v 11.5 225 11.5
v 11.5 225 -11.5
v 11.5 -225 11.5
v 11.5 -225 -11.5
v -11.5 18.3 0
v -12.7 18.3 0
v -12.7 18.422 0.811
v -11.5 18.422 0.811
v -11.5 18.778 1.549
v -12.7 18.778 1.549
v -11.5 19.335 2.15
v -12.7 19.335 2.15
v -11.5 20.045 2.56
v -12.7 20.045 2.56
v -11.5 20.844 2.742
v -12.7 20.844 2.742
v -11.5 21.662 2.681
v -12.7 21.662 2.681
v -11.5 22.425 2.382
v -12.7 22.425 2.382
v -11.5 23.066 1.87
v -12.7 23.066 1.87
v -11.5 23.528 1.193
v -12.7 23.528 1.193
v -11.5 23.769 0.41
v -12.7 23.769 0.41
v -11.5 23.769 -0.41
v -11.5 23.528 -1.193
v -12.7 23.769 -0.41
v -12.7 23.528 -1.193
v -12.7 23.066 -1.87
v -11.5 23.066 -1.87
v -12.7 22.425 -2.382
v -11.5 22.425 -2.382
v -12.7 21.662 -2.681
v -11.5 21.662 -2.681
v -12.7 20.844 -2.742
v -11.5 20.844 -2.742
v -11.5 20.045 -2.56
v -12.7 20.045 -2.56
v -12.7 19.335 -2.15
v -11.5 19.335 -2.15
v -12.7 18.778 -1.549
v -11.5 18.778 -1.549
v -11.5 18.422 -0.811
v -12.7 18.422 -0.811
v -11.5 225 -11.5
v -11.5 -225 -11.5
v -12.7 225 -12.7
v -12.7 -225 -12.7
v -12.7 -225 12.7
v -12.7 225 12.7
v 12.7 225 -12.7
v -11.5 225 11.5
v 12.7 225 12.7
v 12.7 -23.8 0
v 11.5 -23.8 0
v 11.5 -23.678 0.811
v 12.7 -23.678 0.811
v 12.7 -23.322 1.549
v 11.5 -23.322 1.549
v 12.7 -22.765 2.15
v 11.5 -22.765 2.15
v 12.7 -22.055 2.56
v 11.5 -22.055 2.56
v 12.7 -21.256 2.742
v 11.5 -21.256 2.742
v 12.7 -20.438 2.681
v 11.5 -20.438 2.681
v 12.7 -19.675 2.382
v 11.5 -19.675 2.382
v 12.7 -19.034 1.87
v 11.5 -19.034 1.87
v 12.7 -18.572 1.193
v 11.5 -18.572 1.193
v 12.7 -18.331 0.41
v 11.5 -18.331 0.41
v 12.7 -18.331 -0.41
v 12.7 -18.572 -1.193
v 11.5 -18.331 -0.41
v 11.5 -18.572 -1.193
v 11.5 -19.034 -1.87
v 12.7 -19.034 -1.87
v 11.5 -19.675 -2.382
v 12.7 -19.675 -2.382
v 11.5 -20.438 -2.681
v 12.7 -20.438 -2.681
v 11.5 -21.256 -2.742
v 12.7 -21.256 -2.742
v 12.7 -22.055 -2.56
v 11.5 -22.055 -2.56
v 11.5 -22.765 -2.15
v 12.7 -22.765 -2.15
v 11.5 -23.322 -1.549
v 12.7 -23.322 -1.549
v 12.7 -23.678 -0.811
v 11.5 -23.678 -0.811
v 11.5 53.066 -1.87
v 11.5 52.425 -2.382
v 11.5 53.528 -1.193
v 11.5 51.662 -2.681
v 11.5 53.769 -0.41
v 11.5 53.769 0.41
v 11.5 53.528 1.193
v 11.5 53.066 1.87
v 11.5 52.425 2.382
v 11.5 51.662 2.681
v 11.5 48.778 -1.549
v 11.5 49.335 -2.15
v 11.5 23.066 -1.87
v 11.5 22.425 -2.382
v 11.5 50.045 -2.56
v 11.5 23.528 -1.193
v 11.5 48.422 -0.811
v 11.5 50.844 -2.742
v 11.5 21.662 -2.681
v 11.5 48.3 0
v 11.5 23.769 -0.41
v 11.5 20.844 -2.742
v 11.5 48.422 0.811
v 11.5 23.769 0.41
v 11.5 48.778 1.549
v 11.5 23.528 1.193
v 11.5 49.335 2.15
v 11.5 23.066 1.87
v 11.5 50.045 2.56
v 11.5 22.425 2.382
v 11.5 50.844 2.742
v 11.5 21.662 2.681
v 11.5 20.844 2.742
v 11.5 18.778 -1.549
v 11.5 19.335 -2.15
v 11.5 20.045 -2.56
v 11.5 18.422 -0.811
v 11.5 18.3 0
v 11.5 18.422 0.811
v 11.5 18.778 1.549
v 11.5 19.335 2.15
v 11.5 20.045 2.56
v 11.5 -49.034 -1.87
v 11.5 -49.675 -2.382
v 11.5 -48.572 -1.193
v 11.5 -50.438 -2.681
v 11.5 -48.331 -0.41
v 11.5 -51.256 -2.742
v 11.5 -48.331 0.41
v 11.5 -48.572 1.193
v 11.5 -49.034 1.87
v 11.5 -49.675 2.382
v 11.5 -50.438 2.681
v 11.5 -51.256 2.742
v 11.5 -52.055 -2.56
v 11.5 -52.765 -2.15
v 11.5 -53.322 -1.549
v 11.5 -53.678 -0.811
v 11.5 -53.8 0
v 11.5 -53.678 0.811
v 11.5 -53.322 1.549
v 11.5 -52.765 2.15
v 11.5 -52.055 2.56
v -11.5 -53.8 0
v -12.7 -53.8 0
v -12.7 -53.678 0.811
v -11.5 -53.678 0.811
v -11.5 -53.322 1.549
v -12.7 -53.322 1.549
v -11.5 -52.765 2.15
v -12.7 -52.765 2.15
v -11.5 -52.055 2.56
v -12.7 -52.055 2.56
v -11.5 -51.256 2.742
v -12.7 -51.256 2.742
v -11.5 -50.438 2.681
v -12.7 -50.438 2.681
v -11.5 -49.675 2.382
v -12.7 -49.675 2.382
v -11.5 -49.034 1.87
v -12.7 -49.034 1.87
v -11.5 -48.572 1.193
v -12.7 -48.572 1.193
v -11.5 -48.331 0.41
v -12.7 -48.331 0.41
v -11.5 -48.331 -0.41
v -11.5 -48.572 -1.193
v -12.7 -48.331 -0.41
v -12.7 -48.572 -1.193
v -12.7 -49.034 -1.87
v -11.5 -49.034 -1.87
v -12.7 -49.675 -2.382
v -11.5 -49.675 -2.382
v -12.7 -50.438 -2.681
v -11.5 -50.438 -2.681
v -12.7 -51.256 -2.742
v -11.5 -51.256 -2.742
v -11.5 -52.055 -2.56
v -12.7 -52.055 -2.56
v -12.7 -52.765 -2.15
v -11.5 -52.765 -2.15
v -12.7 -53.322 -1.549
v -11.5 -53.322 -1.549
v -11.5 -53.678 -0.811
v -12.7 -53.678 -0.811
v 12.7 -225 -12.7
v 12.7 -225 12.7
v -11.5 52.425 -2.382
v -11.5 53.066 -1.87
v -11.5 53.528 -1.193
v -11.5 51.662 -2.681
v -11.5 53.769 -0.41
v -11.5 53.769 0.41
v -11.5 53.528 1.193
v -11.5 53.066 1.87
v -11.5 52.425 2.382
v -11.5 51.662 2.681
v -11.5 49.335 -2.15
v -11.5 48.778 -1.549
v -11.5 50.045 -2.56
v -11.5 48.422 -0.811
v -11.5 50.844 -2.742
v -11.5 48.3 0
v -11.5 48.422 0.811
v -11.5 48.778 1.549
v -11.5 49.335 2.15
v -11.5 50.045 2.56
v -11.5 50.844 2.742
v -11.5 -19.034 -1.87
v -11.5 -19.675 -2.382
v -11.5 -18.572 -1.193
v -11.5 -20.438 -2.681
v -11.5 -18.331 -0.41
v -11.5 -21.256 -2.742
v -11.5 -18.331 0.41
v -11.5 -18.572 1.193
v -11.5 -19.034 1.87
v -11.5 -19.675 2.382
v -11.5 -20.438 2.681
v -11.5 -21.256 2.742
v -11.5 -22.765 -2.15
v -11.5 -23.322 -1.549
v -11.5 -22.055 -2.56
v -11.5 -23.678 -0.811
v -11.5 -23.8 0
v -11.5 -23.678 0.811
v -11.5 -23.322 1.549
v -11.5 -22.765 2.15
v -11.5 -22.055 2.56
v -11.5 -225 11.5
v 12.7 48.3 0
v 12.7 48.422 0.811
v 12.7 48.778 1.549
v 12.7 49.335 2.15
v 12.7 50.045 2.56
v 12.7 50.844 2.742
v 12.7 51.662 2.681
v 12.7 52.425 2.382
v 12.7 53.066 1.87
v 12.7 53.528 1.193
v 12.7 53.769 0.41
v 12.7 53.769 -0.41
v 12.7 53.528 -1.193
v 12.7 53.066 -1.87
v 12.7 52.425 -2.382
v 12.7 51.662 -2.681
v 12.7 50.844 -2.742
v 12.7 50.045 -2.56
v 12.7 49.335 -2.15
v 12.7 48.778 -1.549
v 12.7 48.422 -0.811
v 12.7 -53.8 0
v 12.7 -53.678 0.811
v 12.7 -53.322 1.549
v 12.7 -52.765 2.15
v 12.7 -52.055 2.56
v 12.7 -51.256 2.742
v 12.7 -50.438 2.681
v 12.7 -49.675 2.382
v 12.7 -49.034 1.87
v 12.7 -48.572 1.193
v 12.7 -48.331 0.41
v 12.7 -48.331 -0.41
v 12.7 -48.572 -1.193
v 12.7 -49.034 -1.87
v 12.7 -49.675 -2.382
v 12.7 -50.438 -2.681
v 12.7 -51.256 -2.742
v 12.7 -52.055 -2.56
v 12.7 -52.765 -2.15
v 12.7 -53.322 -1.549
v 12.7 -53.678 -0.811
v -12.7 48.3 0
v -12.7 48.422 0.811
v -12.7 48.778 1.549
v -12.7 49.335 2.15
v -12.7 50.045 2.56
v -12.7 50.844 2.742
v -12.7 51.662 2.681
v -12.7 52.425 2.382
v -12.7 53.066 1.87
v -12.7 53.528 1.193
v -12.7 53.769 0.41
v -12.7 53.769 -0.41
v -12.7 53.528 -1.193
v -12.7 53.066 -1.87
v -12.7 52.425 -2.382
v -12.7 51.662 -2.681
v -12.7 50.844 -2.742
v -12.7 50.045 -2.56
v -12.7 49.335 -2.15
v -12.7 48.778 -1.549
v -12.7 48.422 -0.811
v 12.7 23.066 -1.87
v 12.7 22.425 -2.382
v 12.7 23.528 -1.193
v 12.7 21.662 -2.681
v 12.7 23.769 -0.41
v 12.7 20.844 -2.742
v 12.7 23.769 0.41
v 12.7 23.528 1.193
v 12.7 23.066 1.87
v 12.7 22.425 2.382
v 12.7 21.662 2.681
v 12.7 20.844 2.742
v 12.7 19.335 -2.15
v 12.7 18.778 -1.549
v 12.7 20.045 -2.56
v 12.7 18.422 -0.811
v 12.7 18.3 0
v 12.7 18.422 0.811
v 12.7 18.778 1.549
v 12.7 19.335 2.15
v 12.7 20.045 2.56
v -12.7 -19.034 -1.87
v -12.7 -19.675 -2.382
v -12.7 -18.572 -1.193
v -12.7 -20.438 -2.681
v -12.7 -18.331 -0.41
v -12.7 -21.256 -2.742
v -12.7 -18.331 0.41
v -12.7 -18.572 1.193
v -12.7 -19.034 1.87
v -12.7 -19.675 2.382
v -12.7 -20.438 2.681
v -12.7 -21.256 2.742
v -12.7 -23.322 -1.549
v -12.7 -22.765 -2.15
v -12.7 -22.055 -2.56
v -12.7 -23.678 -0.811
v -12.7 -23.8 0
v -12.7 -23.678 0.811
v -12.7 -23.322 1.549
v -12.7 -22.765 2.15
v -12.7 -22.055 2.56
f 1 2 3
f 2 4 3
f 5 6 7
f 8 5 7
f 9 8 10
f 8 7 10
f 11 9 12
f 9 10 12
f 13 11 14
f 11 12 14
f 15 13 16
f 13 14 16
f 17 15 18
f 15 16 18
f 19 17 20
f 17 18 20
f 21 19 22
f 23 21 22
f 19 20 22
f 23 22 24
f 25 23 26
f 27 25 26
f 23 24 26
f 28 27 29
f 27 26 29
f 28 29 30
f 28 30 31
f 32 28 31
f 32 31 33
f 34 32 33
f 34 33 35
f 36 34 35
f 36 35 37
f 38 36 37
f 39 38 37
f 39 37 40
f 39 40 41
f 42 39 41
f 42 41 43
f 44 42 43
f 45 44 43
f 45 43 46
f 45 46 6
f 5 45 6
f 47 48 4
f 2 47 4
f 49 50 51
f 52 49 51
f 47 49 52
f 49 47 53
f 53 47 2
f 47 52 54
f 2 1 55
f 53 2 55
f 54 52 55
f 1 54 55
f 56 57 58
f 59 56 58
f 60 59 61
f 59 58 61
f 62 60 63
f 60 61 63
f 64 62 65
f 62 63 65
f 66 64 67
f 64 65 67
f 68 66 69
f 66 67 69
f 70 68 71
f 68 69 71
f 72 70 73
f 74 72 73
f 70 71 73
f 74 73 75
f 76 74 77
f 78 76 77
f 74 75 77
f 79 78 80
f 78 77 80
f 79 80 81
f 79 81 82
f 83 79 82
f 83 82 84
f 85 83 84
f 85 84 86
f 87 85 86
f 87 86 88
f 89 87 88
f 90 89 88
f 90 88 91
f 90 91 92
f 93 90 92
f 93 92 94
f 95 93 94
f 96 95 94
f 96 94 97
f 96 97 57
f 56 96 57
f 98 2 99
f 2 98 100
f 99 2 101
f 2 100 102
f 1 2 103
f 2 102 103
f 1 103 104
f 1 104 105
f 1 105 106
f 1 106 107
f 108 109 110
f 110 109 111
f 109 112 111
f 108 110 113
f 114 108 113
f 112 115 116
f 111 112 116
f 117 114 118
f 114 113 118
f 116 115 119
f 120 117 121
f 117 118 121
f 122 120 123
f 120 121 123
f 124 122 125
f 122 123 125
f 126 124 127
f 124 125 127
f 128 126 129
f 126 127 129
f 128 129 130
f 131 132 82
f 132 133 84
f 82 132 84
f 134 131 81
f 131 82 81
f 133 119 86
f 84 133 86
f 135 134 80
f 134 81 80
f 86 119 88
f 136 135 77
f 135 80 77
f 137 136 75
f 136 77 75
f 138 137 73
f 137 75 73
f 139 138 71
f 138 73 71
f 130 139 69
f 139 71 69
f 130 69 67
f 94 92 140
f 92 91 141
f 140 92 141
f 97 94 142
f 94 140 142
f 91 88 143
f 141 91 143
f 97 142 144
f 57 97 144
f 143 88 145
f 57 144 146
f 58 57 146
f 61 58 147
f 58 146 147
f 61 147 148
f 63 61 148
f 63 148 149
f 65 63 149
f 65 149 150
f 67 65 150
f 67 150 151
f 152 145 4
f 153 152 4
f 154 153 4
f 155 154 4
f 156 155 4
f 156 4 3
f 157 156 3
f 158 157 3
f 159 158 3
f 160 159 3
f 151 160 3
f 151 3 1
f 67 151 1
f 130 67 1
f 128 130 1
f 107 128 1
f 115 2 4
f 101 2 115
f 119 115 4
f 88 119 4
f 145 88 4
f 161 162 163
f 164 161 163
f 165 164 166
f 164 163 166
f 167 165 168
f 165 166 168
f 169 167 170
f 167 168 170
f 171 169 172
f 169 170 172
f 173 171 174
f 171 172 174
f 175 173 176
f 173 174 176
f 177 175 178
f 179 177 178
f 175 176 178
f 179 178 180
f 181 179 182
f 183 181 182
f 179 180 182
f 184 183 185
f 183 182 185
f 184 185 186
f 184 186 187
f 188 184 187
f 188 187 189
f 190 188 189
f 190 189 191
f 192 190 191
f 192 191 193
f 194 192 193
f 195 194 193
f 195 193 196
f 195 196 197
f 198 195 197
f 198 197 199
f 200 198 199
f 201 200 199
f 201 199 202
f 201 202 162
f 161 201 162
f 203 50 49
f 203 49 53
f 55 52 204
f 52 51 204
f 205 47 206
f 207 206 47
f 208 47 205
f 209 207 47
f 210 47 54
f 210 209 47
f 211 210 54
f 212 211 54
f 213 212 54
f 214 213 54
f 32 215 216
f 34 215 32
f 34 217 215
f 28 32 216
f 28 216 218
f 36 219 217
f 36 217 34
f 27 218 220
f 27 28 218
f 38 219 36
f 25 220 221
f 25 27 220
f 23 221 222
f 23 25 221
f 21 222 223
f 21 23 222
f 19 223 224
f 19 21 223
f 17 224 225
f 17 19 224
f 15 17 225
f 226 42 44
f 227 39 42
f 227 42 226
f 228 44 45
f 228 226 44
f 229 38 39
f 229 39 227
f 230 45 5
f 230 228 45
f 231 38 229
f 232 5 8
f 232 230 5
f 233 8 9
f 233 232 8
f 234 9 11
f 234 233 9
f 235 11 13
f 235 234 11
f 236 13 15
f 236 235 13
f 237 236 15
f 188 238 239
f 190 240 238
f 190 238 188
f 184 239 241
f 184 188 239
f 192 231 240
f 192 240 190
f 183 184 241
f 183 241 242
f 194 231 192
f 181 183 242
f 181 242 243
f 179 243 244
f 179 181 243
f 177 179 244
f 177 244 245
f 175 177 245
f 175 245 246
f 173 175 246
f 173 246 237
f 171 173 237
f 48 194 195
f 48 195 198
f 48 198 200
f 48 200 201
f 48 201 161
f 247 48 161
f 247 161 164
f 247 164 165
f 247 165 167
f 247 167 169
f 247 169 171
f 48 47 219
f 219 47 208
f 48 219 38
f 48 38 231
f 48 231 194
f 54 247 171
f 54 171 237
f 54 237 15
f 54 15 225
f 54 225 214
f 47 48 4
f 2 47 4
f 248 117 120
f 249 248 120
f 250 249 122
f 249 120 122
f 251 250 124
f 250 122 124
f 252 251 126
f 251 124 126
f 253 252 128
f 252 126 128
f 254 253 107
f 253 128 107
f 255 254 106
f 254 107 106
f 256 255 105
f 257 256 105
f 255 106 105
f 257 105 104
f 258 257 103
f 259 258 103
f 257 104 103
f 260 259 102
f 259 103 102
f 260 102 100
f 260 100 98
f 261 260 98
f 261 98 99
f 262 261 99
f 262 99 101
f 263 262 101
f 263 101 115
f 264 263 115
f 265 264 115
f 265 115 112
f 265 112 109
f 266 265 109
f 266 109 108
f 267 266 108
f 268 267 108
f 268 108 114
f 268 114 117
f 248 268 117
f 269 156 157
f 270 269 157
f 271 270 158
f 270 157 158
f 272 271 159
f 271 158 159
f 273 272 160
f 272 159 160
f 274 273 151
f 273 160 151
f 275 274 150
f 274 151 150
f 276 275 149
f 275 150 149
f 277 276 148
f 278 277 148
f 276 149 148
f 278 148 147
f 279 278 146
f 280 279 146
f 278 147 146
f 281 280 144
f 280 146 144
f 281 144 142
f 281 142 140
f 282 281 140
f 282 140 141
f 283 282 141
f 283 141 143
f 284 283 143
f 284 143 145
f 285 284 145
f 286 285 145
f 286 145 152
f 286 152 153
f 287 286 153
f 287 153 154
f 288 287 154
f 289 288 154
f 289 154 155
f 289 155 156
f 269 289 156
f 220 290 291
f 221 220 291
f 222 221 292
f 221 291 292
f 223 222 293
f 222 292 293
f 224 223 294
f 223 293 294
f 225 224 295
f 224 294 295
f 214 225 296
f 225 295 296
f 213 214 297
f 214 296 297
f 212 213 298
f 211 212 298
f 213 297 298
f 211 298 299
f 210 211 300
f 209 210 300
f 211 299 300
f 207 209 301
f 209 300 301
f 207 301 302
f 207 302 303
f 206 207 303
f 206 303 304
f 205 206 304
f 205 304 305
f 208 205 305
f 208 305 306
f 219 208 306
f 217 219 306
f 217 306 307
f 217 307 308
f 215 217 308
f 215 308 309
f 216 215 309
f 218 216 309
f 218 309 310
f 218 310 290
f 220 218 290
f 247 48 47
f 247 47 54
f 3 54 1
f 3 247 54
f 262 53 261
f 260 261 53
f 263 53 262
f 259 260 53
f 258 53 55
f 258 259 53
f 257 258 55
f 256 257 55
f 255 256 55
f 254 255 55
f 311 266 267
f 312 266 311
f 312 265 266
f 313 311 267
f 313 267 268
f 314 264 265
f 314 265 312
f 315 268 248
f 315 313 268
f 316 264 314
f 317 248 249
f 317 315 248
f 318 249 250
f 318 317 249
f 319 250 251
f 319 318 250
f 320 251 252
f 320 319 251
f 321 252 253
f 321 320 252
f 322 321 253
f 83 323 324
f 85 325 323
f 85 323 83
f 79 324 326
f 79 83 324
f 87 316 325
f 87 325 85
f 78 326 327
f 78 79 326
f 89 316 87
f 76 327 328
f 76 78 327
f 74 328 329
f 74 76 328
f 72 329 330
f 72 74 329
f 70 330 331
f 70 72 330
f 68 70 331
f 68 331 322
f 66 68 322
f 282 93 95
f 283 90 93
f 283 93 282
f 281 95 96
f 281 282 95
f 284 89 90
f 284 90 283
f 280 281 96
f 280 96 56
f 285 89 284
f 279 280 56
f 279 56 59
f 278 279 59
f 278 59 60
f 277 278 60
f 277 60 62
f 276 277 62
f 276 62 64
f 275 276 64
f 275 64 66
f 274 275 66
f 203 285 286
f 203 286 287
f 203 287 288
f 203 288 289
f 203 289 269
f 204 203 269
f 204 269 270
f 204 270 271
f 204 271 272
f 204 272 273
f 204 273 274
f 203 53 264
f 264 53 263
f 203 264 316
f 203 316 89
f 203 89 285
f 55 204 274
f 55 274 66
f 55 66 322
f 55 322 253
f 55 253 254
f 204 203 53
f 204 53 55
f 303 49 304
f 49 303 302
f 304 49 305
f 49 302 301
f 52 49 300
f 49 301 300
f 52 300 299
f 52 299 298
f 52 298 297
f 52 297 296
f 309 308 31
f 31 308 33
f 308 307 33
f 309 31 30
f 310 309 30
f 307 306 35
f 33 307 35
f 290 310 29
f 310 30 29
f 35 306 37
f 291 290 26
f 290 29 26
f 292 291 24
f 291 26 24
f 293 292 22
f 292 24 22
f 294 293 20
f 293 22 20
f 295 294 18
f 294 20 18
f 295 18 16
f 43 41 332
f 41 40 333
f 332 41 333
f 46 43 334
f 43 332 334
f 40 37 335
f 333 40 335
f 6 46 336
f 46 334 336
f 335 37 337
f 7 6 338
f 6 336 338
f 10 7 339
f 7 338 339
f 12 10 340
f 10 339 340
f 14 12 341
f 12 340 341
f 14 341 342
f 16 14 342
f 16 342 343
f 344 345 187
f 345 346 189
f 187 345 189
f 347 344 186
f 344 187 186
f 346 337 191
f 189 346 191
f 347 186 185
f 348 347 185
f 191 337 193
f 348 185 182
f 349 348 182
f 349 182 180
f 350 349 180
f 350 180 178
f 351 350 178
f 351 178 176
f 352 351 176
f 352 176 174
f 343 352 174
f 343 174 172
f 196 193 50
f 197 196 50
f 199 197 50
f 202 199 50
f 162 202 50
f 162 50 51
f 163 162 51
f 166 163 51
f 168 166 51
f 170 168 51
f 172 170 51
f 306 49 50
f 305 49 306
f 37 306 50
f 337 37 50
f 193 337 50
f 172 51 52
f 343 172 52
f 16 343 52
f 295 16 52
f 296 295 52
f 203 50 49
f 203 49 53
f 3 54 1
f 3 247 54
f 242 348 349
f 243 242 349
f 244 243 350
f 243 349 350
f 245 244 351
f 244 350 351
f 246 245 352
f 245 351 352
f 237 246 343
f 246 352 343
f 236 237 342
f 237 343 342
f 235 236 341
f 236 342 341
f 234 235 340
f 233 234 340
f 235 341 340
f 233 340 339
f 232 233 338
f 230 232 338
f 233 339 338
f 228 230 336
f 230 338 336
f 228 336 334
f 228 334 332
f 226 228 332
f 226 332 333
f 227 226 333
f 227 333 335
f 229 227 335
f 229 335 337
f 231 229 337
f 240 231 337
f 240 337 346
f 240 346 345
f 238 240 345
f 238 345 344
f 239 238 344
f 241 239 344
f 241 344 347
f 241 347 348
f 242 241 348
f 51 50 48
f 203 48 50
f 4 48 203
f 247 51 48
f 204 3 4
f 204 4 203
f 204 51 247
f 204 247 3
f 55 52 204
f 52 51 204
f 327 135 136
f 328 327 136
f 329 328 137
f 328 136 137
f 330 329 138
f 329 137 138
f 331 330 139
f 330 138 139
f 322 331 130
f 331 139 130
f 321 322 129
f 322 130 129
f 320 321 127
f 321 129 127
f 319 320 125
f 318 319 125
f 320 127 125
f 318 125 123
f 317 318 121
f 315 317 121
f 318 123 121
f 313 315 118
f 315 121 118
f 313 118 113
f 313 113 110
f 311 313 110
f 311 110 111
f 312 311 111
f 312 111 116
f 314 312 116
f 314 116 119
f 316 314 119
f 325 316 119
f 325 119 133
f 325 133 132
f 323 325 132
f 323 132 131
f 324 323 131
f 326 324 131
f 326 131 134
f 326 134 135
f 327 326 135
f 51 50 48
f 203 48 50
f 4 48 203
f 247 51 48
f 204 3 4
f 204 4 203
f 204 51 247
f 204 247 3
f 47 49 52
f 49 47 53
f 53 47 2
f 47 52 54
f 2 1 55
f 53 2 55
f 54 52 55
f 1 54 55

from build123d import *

# Parameters (mm, degrees)
F0_W     = 25.4
F0_H     = 25.4
F0_W_2   = 23
F0_H_2   = 23
F1_DEPTH = 225
F2_DEPTH = 225
F4_D     = 5.5


with BuildPart() as f1:
    # F0 (on Front) → F1 (new body, symmetric)
    with BuildSketch(Plane.XZ):
        Rectangle(F0_W, F0_H)
        Rectangle(F0_W_2, F0_H_2, mode=Mode.SUBTRACT)
    extrude(amount=F1_DEPTH, both=True)


with BuildPart() as f2:
    # F0 (on Front) → F2 (new body, symmetric)
    with BuildSketch(Plane.XZ):
        Rectangle(F0_W, F0_H)
        Rectangle(F0_W_2, F0_H_2, mode=Mode.SUBTRACT)
    extrude(amount=F2_DEPTH, both=True)

    # F4 (through all)
    with Locations(Plane.YZ.offset(12.7)):
        with Locations((-51.05, 0), (-21.05, 0), (21.05, 0), (51.05, 0)):
            Hole(F4_D / 2)


solid = Compound([f1.part, f2.part])
